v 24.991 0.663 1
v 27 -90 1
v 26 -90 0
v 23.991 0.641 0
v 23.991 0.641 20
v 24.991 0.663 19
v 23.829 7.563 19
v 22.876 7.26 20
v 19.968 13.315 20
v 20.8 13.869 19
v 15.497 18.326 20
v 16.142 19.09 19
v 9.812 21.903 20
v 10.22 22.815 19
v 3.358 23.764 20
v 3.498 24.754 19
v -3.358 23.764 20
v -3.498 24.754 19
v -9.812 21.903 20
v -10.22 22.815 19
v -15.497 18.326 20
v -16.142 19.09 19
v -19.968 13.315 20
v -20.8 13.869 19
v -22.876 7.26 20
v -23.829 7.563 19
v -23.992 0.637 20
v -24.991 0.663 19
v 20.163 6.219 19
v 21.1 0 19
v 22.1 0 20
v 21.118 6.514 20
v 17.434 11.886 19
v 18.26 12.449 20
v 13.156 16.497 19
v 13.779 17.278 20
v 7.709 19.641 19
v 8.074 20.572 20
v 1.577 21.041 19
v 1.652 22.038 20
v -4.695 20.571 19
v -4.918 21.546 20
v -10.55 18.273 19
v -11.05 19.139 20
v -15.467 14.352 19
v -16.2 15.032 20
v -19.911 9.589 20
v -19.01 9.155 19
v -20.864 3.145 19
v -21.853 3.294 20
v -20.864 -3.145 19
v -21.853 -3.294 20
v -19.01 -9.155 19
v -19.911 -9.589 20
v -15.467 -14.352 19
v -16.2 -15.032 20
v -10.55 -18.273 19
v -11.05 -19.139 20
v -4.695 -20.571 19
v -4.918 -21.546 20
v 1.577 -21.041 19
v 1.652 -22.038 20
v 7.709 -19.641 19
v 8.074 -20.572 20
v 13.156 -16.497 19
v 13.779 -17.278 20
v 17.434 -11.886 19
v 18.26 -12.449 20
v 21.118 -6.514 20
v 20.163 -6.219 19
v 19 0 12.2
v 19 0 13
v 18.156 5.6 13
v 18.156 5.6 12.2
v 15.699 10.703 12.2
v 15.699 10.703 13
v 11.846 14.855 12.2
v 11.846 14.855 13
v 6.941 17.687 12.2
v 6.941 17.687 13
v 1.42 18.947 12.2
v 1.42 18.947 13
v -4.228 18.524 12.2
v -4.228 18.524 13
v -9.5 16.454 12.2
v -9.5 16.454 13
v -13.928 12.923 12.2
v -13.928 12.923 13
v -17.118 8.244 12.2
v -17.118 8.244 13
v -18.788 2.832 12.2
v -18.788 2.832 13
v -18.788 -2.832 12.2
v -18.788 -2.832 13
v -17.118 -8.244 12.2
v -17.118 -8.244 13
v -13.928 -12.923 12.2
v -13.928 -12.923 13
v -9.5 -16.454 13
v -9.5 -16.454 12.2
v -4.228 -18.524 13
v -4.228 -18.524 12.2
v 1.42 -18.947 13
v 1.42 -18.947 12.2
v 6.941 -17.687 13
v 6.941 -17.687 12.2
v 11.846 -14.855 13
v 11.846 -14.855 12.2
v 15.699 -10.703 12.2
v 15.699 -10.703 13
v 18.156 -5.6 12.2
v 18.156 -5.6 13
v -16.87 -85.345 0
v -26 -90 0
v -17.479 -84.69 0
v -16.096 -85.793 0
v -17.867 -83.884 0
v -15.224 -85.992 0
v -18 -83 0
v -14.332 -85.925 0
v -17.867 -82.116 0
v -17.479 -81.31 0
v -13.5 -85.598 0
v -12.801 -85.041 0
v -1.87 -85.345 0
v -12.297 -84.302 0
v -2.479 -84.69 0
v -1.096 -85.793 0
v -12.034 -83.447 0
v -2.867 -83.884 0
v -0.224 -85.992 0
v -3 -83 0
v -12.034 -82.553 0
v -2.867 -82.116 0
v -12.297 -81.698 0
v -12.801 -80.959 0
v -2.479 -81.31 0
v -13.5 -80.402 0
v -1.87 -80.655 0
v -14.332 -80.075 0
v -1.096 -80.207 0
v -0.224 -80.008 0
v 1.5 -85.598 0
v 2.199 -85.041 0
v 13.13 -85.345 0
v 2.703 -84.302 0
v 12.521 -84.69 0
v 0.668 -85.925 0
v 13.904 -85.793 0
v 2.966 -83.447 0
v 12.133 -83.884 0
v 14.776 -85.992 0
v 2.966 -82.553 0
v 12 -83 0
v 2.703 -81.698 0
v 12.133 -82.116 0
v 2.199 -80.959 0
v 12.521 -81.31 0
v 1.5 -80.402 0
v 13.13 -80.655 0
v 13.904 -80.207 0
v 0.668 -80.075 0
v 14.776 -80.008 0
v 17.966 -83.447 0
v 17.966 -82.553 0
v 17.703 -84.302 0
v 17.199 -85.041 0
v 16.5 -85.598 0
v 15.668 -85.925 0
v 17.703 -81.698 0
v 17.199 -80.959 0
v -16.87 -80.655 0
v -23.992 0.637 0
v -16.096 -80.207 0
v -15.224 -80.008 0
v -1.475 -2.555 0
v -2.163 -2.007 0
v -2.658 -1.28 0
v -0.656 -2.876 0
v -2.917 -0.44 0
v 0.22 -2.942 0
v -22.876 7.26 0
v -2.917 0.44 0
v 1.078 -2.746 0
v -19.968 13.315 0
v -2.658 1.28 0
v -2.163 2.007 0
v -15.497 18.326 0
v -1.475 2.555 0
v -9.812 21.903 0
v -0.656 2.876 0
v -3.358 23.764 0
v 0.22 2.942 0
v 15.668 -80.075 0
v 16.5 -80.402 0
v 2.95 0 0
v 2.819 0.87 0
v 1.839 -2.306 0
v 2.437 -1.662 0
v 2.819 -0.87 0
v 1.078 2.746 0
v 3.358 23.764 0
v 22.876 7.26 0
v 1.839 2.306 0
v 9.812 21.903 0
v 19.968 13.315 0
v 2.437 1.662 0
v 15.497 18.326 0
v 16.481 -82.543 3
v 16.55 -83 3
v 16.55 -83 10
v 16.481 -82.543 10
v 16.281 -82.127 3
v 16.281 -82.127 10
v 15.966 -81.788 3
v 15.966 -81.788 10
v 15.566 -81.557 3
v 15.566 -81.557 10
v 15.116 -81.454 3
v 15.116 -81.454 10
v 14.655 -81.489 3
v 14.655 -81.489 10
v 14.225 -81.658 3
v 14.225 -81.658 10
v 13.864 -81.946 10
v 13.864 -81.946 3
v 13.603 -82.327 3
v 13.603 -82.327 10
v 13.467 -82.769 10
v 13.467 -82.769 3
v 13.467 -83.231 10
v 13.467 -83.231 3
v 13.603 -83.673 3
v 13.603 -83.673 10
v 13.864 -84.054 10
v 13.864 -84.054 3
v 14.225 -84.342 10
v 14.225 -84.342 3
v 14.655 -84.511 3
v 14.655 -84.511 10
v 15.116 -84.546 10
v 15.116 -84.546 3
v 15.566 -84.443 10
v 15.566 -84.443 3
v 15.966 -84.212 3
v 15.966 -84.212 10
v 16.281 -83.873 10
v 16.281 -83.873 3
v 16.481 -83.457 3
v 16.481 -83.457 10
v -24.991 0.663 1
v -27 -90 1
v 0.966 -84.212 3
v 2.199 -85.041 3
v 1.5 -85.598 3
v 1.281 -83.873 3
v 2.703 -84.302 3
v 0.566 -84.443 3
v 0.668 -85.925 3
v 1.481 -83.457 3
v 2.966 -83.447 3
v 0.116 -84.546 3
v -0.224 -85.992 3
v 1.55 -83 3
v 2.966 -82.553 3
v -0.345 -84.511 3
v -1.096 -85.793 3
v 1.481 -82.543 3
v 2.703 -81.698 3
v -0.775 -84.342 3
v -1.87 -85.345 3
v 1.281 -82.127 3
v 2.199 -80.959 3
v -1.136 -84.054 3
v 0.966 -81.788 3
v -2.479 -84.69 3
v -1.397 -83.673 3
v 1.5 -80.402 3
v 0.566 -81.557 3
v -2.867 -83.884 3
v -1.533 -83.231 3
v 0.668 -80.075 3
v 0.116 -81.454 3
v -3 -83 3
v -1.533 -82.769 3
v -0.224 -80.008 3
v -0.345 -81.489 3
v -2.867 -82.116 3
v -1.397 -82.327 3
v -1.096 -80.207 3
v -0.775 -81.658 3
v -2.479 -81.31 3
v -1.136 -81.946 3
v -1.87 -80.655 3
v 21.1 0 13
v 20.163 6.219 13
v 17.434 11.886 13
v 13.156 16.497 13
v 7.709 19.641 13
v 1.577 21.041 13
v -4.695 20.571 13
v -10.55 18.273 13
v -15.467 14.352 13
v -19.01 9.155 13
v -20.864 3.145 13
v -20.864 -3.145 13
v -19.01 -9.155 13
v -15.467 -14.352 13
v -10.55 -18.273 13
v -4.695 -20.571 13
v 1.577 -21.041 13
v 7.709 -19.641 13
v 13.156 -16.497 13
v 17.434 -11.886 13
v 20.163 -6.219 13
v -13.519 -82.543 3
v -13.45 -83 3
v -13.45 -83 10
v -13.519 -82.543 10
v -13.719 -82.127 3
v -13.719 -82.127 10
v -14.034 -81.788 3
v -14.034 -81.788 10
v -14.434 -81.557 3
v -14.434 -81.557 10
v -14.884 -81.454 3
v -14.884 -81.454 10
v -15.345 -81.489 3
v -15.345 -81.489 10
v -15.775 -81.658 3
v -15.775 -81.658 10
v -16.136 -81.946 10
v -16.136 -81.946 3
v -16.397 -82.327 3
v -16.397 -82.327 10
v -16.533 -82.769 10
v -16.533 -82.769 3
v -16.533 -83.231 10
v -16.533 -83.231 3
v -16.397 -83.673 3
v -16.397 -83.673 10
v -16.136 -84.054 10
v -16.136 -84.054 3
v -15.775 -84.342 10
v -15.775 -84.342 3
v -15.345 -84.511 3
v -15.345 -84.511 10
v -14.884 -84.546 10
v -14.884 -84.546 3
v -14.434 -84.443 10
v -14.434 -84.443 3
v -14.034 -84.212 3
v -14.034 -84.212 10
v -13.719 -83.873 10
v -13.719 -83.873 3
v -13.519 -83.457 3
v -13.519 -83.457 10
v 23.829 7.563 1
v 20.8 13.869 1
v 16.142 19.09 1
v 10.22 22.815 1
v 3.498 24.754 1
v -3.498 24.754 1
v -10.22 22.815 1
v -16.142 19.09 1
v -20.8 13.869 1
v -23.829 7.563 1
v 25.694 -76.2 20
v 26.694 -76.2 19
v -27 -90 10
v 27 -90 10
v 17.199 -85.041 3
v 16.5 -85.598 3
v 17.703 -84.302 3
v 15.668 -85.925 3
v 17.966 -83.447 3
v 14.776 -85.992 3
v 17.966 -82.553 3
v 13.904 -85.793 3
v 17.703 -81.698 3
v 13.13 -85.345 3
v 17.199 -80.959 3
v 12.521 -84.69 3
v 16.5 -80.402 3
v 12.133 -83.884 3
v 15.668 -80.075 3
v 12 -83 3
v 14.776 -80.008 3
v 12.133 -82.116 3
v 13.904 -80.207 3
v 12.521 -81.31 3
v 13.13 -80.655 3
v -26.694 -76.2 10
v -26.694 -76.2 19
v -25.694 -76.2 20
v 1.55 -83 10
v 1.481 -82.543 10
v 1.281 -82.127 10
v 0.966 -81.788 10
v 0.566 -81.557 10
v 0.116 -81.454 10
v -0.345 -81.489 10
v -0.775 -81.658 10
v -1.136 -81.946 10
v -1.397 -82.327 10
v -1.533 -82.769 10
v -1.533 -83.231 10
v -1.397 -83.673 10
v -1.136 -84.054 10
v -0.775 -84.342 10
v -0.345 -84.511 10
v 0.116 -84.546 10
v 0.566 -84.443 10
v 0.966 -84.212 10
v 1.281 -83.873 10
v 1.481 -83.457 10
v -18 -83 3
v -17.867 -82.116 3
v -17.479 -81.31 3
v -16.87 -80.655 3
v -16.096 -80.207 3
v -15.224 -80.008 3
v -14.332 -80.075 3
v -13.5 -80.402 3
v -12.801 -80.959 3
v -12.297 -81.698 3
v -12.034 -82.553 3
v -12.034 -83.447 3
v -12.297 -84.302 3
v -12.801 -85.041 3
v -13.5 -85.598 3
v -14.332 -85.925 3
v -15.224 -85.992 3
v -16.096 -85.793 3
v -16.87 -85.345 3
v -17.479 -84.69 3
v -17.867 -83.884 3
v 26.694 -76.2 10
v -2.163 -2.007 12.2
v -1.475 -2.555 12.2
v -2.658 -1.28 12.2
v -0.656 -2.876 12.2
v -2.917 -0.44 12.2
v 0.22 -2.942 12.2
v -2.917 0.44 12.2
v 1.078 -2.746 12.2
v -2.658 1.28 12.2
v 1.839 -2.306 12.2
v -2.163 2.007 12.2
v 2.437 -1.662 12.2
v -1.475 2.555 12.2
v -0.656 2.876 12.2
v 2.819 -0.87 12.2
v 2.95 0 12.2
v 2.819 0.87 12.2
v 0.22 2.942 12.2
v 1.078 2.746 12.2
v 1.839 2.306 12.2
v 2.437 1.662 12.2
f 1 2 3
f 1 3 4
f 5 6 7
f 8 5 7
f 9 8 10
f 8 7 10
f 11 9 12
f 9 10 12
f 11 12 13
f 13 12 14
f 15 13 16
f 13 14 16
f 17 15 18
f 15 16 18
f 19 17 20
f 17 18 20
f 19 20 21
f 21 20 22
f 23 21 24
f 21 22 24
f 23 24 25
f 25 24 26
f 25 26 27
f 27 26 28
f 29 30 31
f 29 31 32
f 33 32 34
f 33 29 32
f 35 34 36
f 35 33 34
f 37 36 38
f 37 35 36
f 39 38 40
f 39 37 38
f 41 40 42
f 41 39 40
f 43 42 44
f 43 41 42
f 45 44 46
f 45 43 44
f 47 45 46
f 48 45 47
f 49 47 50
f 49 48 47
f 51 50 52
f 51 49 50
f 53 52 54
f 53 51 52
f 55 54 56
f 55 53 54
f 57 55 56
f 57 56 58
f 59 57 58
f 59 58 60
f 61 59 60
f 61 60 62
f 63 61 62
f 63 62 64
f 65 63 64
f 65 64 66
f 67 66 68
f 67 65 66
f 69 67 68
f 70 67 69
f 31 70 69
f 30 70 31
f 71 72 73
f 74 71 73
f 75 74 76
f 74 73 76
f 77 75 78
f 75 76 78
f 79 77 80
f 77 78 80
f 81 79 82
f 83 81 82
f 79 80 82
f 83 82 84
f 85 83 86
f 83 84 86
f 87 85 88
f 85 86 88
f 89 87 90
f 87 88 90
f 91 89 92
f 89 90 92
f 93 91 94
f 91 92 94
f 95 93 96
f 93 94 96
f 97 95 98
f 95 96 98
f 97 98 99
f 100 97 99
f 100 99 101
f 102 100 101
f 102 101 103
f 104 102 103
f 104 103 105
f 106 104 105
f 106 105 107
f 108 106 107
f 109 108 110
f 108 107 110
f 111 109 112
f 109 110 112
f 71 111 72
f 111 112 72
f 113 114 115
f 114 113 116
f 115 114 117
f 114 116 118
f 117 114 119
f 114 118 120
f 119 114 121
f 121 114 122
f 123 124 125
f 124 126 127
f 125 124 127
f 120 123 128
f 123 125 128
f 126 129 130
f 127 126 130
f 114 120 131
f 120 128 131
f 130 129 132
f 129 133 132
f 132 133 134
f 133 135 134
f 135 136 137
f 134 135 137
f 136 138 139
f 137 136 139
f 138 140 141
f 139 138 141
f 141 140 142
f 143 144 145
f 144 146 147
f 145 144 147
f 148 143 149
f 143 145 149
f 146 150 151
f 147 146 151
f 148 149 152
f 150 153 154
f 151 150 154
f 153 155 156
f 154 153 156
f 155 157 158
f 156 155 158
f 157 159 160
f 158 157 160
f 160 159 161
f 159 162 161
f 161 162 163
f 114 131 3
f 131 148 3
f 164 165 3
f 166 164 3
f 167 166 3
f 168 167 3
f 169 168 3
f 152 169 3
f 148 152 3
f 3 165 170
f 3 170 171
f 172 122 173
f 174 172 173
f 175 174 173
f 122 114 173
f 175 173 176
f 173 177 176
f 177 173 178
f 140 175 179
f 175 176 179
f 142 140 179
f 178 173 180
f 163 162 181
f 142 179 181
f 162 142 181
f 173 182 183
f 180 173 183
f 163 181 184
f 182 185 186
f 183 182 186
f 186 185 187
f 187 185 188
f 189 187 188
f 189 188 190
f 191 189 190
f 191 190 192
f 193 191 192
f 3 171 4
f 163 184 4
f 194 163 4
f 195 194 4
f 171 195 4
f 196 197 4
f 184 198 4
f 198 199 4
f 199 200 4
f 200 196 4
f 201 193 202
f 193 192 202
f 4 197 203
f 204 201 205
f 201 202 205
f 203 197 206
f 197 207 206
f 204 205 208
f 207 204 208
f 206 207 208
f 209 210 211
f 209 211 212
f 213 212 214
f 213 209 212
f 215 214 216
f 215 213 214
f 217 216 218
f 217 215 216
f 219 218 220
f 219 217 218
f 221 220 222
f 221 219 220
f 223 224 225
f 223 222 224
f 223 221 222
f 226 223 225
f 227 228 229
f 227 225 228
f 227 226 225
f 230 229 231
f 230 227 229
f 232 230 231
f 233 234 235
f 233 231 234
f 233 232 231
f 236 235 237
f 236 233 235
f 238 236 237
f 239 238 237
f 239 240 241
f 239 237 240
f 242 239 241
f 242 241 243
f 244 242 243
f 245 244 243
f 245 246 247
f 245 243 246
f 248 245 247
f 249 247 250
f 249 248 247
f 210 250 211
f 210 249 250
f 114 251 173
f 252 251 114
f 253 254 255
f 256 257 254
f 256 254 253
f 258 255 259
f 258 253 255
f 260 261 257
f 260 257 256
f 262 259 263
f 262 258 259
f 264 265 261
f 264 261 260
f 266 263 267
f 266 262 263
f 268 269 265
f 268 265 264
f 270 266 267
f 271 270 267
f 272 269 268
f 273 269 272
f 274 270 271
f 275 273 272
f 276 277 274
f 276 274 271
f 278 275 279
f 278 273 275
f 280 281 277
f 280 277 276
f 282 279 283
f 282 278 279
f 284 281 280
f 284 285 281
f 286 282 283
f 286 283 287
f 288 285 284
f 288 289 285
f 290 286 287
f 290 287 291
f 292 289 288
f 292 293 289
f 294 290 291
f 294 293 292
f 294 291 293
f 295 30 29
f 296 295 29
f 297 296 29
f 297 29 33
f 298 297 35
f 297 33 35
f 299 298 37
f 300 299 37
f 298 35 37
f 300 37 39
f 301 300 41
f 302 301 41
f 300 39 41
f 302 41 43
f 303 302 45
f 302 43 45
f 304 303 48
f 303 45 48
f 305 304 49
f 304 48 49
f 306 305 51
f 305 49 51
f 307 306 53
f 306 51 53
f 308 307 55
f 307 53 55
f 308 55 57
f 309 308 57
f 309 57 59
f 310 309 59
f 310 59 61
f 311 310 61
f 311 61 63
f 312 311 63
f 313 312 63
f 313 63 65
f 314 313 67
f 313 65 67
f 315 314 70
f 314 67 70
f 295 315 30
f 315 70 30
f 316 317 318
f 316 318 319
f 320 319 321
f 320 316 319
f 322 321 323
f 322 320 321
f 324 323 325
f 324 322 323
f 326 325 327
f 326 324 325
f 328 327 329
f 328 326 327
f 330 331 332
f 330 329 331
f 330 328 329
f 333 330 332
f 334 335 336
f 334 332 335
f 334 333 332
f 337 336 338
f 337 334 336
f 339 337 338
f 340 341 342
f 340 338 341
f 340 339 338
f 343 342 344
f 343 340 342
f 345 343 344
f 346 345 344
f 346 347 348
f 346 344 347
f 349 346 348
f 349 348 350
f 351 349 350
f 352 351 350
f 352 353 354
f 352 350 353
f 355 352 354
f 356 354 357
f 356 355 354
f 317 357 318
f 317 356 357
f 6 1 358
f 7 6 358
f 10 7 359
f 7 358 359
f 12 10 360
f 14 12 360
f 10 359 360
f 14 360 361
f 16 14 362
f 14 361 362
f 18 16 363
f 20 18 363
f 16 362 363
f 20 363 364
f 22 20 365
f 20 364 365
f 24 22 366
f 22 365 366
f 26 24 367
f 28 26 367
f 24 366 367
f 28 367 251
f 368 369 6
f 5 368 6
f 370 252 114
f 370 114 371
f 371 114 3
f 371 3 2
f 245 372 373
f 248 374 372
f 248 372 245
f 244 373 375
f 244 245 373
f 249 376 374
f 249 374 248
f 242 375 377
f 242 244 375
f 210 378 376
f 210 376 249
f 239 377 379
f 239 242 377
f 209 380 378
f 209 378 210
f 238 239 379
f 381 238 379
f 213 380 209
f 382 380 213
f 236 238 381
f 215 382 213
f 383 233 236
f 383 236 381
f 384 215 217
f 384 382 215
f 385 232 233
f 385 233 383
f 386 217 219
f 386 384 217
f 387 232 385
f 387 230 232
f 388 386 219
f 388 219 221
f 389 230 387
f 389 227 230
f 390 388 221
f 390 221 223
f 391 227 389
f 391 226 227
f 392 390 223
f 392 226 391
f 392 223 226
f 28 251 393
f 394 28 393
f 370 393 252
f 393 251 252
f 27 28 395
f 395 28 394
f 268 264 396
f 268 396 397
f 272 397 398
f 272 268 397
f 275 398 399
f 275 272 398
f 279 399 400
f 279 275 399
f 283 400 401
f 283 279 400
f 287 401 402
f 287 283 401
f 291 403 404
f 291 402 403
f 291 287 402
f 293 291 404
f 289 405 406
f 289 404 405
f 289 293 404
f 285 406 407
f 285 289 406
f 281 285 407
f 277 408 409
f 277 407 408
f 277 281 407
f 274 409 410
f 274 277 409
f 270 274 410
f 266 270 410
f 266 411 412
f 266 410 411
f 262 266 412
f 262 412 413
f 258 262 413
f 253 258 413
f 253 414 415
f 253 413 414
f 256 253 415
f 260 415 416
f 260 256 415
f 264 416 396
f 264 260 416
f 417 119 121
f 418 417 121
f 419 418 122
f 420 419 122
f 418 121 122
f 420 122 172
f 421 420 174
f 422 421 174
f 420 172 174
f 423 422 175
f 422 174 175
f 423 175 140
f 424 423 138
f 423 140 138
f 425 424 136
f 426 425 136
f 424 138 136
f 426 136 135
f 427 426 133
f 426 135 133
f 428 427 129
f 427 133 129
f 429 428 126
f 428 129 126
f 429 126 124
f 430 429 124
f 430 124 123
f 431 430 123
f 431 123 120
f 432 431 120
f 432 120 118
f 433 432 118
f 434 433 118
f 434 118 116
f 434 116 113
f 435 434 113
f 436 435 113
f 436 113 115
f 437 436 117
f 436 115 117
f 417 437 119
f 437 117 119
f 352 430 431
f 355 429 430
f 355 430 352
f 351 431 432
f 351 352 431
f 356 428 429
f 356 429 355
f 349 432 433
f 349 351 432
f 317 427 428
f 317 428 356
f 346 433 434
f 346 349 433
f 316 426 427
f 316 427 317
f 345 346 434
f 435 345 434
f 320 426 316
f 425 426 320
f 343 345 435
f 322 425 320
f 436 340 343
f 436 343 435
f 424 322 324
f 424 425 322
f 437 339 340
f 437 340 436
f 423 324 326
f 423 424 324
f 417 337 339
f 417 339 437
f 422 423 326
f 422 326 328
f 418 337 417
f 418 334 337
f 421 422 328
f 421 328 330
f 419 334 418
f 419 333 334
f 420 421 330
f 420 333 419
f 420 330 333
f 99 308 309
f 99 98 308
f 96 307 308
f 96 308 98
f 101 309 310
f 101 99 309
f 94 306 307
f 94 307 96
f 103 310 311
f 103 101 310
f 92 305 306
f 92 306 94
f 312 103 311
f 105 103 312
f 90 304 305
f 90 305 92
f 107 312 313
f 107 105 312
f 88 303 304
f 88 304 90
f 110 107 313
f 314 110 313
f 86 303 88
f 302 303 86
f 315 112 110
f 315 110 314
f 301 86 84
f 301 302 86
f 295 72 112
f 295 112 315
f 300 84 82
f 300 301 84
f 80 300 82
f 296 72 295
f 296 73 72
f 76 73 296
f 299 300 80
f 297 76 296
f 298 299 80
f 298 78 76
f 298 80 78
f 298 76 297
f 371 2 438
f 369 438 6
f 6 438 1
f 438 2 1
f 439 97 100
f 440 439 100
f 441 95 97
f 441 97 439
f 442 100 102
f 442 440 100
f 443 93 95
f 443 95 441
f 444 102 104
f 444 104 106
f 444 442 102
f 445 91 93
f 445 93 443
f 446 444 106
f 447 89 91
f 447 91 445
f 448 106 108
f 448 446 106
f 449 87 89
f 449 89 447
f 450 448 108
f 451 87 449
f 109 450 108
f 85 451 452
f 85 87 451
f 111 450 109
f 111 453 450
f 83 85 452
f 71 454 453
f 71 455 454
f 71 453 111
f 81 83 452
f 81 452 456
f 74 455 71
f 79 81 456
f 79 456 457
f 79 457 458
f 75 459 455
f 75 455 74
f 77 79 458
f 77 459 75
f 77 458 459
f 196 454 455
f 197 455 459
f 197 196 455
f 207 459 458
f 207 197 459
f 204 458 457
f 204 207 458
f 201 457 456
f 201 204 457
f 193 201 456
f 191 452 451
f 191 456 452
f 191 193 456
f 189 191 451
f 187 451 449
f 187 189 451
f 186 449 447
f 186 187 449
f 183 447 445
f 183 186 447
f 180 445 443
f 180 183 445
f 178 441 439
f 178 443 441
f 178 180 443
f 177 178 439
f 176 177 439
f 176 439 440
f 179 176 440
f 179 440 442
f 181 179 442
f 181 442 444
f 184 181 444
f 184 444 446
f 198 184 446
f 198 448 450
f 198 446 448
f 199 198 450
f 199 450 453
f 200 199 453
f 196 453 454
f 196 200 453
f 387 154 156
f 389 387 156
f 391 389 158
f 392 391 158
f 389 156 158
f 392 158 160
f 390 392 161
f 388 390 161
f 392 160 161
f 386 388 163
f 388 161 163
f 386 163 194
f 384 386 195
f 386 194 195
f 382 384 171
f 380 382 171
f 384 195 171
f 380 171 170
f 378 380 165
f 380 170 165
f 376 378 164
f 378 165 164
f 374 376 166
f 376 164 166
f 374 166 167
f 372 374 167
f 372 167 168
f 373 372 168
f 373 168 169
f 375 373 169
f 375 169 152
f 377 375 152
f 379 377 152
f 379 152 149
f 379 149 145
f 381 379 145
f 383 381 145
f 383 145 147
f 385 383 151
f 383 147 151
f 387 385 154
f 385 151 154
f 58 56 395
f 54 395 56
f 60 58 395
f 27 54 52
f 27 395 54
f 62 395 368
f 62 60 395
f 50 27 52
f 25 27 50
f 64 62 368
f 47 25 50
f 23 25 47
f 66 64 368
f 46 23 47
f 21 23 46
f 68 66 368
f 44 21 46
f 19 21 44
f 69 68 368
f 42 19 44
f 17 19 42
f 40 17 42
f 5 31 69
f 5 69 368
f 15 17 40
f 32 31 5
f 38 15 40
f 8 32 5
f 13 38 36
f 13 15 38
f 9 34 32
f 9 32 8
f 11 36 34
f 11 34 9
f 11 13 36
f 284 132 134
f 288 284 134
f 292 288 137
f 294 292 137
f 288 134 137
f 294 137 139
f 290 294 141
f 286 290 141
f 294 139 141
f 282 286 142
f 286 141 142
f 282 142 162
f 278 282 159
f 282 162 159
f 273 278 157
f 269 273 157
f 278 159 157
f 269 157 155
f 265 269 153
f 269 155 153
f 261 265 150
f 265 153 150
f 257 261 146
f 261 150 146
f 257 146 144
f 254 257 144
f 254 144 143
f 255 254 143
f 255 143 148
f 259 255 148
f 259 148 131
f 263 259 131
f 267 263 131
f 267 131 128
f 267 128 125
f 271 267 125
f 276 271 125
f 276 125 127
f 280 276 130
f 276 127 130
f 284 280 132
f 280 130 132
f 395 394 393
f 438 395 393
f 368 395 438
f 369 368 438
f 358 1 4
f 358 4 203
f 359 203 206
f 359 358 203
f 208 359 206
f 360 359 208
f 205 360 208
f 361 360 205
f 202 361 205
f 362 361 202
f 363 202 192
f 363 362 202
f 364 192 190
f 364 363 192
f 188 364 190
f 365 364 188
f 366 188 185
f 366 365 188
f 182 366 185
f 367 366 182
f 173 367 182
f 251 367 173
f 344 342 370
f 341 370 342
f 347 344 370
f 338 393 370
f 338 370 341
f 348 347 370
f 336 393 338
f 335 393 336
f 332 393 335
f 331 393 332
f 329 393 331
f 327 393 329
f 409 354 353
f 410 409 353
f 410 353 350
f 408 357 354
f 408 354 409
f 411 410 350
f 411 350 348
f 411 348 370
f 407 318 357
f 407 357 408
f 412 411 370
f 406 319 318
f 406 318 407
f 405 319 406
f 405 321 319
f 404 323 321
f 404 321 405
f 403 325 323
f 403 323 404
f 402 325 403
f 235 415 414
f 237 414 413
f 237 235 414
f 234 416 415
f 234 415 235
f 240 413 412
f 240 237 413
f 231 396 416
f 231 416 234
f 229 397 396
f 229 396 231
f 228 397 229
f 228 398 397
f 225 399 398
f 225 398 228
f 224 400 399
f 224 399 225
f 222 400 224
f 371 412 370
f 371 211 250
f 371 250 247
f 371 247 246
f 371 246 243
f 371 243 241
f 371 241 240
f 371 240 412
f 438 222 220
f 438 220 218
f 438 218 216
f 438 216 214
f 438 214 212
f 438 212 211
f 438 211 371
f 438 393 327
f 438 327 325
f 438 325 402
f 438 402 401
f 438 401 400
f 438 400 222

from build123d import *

# Parameters (mm, degrees)
SKETCH_2_R          = 2.95
SKETCH_2_R_2        = 1.55
EXTRUDE_1_DEPTH     = 20
SKETCH_3_W          = 53.999961589
SKETCH_3_H          = 13.8
CUT_EXTRUDE_1_DEPTH = 10
SKETCH_4_R          = 21.1
CUT_EXTRUDE_2_DEPTH = 7
SKETCH_5_R          = 19
CUT_EXTRUDE_3_DEPTH = 0.8
CHAMFER_1_SIZE      = 1
SKETCH_6_R          = 3
CUT_EXTRUDE_4_DEPTH = 3


with BuildPart() as part:
    # 草图2 → 凸台-拉伸1 (new body)
    with BuildSketch(Plane.XY):
        with BuildLine():
            Line((-24.99119492, 0.663496162), (-27, -90))
            Line((-27, -90), (0, -90))
            Line((0, -90), (26.999961589, -90))
            Line((26.999961589, -90), (24.991195257, 0.663483484))
            ThreePointArc((24.991195257, 0.663483484), (6.341e-06, 25.000001014), (-24.99119492, 0.663496162))
        make_face()
        Circle(SKETCH_2_R, mode=Mode.SUBTRACT)
        with Locations((-15, -83)):
            Circle(SKETCH_2_R_2, mode=Mode.SUBTRACT)
        with Locations((0, -83)):
            Circle(SKETCH_2_R_2, mode=Mode.SUBTRACT)
        with Locations((15, -83)):
            Circle(SKETCH_2_R_2, mode=Mode.SUBTRACT)
    extrude(amount=EXTRUDE_1_DEPTH)

    # 草图3 → 切除-拉伸1 (cut)
    with BuildSketch(Plane.XY.offset(20)):
        with Locations((-1.9205e-05, -83.1)):
            Rectangle(SKETCH_3_W, SKETCH_3_H)
    extrude(amount=-CUT_EXTRUDE_1_DEPTH, mode=Mode.SUBTRACT)

    # 草图4 → 切除-拉伸2 (cut)
    with BuildSketch(Plane.XY.offset(20)):
        Circle(SKETCH_4_R)
    extrude(amount=-CUT_EXTRUDE_2_DEPTH, mode=Mode.SUBTRACT)

    # 草图5 → 切除-拉伸3 (cut)
    with BuildSketch(Plane.XY.offset(13)):
        Circle(SKETCH_5_R)
    extrude(amount=-CUT_EXTRUDE_3_DEPTH, mode=Mode.SUBTRACT)

    # 倒角1
    chamfer_1_edges = [part.edges().sort_by_distance(p)[0] for p in [
        (25.84270003, -37.768258258, 20),
        (6.341e-06, 25.000001014, 20),
        (25.995578423, -44.668258258, 0),
        (-21.1, 0, 20),
        (-25.99559746, -44.668251919, 0),
        (6.341e-06, 25.000001014, 0),
        (-25.842716139, -37.768251919, 20),
    ]]
    chamfer(chamfer_1_edges, length=CHAMFER_1_SIZE)

    # 草图6 → 切除-拉伸4 (cut)
    with BuildSketch(Plane(origin=(0, 0, 0), x_dir=(-1, 0, 0), z_dir=(0, 0, -1))):
        with Locations((-15, -83)):
            Circle(SKETCH_6_R)
        with Locations((0, -83)):
            Circle(SKETCH_6_R)
        with Locations((15, -83)):
            Circle(SKETCH_6_R)
    extrude(amount=-CUT_EXTRUDE_4_DEPTH, mode=Mode.SUBTRACT)


solid = part.part
